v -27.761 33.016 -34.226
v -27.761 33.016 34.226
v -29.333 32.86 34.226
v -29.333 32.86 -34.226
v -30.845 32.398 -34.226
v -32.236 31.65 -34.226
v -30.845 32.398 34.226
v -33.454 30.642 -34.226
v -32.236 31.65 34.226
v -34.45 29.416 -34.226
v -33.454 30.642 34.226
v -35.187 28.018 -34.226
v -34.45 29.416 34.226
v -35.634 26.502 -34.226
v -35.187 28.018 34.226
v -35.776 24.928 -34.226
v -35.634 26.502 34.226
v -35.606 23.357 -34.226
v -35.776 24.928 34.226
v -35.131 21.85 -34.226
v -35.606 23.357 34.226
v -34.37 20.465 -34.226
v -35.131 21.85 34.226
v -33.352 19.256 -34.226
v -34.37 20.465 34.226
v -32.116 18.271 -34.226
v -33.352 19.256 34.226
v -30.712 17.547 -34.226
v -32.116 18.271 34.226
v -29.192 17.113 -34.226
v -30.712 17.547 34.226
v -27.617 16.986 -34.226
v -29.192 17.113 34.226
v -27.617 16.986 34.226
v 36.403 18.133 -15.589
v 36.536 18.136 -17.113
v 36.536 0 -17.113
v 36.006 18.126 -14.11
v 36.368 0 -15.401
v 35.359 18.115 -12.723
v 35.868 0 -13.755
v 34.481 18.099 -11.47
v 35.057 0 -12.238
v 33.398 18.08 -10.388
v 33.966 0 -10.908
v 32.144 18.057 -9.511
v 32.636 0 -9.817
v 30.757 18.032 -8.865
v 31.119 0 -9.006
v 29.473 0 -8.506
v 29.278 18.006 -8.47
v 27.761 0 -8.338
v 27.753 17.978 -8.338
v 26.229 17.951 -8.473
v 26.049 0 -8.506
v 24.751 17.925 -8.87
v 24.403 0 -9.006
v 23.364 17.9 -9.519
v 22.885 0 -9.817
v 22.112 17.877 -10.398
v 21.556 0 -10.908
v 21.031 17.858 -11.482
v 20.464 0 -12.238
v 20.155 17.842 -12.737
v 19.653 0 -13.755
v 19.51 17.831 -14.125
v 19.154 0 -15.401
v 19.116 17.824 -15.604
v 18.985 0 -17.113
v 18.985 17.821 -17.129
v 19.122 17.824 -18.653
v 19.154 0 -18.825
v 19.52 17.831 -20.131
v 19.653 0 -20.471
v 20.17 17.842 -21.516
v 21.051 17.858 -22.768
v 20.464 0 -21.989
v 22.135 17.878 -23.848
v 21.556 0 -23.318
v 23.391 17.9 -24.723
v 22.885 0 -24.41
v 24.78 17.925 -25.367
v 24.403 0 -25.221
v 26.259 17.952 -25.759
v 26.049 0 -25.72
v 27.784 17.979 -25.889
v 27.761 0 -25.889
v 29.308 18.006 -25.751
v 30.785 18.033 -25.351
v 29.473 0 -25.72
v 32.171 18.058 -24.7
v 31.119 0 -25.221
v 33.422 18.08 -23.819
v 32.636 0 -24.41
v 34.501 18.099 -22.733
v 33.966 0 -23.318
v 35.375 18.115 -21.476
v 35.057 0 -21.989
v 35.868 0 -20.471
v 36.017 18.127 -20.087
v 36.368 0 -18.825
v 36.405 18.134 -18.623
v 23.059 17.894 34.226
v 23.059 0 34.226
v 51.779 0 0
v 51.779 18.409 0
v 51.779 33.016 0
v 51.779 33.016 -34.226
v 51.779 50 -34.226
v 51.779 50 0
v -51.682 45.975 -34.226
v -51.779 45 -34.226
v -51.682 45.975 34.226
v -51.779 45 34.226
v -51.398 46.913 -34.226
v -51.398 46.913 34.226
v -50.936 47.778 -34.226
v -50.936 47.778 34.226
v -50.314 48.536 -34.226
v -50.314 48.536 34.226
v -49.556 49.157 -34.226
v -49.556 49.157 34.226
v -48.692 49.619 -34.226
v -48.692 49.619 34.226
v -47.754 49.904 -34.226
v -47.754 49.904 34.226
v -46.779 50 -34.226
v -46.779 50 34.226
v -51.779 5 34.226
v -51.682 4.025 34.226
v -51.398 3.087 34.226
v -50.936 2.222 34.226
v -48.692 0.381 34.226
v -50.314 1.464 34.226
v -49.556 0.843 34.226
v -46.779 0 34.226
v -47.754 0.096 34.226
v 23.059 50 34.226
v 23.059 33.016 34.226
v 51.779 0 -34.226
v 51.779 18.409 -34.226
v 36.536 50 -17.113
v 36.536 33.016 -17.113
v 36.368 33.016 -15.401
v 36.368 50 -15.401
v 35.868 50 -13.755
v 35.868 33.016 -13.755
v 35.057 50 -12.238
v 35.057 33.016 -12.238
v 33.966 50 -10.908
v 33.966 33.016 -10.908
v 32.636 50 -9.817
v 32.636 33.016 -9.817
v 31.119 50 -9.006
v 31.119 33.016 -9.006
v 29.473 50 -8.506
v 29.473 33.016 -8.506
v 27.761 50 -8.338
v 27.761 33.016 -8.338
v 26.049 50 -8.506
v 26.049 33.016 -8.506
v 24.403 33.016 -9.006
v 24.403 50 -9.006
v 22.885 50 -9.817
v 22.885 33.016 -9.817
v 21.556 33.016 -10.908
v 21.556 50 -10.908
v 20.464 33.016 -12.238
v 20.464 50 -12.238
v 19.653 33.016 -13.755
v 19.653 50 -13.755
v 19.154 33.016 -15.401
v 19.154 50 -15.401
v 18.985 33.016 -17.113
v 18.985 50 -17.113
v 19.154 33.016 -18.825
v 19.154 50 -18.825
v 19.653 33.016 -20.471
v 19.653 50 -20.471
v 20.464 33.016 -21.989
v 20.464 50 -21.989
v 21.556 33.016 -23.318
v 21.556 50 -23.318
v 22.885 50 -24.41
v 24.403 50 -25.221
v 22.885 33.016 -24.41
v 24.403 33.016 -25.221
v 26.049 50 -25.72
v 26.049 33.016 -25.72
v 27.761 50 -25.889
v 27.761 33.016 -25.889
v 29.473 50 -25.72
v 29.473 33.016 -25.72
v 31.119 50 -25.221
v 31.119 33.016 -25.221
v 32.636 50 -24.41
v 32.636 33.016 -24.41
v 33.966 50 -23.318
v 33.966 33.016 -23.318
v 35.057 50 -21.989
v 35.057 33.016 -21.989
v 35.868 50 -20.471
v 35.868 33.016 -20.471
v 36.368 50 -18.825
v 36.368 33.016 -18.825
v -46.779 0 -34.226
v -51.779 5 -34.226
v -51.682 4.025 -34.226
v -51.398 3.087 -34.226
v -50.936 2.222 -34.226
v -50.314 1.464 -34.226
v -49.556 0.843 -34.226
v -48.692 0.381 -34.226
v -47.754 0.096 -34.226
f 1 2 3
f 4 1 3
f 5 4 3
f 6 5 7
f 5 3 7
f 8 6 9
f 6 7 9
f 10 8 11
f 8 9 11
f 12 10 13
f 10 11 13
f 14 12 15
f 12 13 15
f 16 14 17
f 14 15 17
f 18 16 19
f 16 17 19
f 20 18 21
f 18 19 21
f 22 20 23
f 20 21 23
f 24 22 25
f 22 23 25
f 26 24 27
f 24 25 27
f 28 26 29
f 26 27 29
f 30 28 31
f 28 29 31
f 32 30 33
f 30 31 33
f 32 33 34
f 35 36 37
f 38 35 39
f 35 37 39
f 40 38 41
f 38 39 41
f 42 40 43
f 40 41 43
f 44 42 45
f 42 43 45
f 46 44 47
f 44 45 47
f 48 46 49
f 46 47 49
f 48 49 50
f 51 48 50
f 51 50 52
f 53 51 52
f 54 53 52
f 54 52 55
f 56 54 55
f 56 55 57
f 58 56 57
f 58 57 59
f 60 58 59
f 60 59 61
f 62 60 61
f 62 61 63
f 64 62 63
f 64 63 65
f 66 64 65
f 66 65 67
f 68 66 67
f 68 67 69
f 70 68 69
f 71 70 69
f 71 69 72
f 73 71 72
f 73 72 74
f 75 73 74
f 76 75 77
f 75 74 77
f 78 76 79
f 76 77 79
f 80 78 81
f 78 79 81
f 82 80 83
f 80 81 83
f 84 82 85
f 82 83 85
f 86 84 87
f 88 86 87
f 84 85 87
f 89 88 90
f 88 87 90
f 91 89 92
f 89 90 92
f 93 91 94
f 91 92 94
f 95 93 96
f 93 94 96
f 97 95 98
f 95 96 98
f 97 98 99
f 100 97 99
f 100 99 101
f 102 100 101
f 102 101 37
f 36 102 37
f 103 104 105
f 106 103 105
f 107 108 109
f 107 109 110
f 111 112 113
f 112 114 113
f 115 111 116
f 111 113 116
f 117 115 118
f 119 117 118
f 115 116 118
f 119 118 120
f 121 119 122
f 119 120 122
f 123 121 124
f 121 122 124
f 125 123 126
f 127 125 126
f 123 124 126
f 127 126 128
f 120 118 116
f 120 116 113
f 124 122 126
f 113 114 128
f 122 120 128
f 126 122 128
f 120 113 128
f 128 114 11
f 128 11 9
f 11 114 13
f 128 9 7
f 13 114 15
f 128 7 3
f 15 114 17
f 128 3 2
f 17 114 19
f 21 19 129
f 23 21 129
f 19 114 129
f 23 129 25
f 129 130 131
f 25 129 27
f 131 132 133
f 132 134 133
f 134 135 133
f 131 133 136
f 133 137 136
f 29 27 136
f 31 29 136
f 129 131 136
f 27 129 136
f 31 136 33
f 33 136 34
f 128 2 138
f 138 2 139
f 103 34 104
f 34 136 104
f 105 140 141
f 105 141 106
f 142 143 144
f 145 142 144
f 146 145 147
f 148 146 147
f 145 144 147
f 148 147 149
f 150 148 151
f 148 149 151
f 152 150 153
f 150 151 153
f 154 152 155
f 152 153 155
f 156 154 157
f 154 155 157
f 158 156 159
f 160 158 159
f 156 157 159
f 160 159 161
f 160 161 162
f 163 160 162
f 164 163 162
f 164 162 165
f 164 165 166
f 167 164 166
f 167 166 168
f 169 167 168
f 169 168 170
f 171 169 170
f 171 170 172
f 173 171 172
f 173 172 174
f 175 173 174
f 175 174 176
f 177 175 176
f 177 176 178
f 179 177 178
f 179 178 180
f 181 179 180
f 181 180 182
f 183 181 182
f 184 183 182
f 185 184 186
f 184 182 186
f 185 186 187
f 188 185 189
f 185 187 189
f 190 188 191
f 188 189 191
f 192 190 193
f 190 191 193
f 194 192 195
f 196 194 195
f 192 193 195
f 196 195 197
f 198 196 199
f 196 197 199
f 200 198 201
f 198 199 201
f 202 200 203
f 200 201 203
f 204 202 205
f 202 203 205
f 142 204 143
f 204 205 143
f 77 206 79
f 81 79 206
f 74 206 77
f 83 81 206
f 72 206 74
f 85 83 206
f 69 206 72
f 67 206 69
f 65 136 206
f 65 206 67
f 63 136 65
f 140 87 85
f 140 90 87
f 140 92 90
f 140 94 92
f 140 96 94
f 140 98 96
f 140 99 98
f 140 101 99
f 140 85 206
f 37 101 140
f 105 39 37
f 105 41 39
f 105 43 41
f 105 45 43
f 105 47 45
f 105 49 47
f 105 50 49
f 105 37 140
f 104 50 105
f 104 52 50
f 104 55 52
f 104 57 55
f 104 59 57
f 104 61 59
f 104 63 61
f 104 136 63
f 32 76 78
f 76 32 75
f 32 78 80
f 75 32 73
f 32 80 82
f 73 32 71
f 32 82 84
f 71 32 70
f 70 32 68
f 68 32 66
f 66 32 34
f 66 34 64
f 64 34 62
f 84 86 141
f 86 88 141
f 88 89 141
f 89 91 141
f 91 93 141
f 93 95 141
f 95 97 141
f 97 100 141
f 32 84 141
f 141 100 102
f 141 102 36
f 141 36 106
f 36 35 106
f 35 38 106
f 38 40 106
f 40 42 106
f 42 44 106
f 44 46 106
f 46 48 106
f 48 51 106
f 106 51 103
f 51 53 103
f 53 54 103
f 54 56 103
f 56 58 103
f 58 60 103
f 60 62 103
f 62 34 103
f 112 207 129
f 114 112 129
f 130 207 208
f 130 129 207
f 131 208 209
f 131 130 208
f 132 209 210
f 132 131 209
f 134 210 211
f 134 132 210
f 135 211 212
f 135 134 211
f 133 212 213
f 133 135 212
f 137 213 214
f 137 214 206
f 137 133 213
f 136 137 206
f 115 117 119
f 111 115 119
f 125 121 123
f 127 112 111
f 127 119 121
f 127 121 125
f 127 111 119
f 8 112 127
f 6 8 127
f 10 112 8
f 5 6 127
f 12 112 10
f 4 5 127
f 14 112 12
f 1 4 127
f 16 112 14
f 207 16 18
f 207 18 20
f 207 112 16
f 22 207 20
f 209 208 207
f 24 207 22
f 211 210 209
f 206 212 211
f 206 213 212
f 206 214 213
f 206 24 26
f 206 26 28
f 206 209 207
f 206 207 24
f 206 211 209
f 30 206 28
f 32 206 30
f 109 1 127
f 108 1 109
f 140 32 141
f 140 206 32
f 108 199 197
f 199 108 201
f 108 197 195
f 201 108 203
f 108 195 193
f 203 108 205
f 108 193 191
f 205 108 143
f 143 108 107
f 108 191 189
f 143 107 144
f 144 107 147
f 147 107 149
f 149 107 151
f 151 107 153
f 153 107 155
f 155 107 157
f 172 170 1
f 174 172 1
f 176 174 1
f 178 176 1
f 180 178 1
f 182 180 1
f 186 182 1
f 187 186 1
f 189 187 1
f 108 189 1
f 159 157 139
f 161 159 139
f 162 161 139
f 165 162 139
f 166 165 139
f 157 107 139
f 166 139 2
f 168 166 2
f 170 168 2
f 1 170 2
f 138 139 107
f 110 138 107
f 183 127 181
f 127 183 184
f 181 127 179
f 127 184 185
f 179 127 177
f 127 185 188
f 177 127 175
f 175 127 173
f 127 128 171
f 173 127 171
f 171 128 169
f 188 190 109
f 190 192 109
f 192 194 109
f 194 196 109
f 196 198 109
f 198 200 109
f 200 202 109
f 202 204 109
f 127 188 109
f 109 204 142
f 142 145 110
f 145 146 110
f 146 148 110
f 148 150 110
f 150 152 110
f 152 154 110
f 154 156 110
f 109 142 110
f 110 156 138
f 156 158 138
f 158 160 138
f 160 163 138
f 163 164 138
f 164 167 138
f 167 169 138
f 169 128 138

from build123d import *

# Parameters (mm, degrees)
F0_W     = 103.557102
F0_H     = 68.452998
F1_DEPTH = 50
F2_R     = 8.015523
F3_DEPTH = 70
F5_DEPTH = 75
F7_DEPTH = 60
F8_R     = 8.775405
F9_DEPTH = 75
F10_R    = 5


with BuildPart() as f1:
    # F0 (on Front) → F1 (new body)
    with BuildSketch(Plane.XZ):
        Rectangle(F0_W, F0_H)
    extrude(amount=-F1_DEPTH)

    # F2 (on face) → F3 (cut)
    with BuildSketch(Plane.XY.offset(34.226499)):
        with Locations((-27.760793, 25)):
            Circle(F2_R)
    extrude(amount=-F3_DEPTH, mode=Mode.SUBTRACT)

    # F4 (on face) → F5 (cut)
    with BuildSketch(Plane.XY.offset(34.226499)):
        with BuildLine():
            Line((51.778551, 33.015523), (-27.760793, 33.015523))
            ThreePointArc((-27.760793, 33.015523), (-22.092962, 30.667831), (-19.74527, 25))
            ThreePointArc((-19.74527, 25), (-22.042391, 19.383196), (-27.617118, 16.985765))
            Line((-27.617118, 16.985765), (51.778551, 18.409128))
            Line((51.778551, 18.409128), (51.778551, 33.015523))
        make_face()
    extrude(amount=-F5_DEPTH, mode=Mode.SUBTRACT)

    # F6 (on face) → F7 (cut)
    with BuildSketch(Plane.XZ):
        Polygon((51.778551, 34.226499), (23.059108, 34.226499), (51.778551, 0), align=None)
    extrude(amount=-F7_DEPTH, mode=Mode.SUBTRACT)

    # F8 (on face) → F9 (cut)
    with BuildSketch(Plane.XZ):
        with Locations((27.760791, -17.11325)):
            Circle(F8_R)
    extrude(amount=-F9_DEPTH, mode=Mode.SUBTRACT)

    # F10
    f10_edges = [f1.edges().sort_by_distance(p)[0] for p in [
        (-51.778551, 0, 0),
        (-51.778551, 50, 0),
    ]]
    fillet(f10_edges, radius=F10_R)


solid = f1.part
